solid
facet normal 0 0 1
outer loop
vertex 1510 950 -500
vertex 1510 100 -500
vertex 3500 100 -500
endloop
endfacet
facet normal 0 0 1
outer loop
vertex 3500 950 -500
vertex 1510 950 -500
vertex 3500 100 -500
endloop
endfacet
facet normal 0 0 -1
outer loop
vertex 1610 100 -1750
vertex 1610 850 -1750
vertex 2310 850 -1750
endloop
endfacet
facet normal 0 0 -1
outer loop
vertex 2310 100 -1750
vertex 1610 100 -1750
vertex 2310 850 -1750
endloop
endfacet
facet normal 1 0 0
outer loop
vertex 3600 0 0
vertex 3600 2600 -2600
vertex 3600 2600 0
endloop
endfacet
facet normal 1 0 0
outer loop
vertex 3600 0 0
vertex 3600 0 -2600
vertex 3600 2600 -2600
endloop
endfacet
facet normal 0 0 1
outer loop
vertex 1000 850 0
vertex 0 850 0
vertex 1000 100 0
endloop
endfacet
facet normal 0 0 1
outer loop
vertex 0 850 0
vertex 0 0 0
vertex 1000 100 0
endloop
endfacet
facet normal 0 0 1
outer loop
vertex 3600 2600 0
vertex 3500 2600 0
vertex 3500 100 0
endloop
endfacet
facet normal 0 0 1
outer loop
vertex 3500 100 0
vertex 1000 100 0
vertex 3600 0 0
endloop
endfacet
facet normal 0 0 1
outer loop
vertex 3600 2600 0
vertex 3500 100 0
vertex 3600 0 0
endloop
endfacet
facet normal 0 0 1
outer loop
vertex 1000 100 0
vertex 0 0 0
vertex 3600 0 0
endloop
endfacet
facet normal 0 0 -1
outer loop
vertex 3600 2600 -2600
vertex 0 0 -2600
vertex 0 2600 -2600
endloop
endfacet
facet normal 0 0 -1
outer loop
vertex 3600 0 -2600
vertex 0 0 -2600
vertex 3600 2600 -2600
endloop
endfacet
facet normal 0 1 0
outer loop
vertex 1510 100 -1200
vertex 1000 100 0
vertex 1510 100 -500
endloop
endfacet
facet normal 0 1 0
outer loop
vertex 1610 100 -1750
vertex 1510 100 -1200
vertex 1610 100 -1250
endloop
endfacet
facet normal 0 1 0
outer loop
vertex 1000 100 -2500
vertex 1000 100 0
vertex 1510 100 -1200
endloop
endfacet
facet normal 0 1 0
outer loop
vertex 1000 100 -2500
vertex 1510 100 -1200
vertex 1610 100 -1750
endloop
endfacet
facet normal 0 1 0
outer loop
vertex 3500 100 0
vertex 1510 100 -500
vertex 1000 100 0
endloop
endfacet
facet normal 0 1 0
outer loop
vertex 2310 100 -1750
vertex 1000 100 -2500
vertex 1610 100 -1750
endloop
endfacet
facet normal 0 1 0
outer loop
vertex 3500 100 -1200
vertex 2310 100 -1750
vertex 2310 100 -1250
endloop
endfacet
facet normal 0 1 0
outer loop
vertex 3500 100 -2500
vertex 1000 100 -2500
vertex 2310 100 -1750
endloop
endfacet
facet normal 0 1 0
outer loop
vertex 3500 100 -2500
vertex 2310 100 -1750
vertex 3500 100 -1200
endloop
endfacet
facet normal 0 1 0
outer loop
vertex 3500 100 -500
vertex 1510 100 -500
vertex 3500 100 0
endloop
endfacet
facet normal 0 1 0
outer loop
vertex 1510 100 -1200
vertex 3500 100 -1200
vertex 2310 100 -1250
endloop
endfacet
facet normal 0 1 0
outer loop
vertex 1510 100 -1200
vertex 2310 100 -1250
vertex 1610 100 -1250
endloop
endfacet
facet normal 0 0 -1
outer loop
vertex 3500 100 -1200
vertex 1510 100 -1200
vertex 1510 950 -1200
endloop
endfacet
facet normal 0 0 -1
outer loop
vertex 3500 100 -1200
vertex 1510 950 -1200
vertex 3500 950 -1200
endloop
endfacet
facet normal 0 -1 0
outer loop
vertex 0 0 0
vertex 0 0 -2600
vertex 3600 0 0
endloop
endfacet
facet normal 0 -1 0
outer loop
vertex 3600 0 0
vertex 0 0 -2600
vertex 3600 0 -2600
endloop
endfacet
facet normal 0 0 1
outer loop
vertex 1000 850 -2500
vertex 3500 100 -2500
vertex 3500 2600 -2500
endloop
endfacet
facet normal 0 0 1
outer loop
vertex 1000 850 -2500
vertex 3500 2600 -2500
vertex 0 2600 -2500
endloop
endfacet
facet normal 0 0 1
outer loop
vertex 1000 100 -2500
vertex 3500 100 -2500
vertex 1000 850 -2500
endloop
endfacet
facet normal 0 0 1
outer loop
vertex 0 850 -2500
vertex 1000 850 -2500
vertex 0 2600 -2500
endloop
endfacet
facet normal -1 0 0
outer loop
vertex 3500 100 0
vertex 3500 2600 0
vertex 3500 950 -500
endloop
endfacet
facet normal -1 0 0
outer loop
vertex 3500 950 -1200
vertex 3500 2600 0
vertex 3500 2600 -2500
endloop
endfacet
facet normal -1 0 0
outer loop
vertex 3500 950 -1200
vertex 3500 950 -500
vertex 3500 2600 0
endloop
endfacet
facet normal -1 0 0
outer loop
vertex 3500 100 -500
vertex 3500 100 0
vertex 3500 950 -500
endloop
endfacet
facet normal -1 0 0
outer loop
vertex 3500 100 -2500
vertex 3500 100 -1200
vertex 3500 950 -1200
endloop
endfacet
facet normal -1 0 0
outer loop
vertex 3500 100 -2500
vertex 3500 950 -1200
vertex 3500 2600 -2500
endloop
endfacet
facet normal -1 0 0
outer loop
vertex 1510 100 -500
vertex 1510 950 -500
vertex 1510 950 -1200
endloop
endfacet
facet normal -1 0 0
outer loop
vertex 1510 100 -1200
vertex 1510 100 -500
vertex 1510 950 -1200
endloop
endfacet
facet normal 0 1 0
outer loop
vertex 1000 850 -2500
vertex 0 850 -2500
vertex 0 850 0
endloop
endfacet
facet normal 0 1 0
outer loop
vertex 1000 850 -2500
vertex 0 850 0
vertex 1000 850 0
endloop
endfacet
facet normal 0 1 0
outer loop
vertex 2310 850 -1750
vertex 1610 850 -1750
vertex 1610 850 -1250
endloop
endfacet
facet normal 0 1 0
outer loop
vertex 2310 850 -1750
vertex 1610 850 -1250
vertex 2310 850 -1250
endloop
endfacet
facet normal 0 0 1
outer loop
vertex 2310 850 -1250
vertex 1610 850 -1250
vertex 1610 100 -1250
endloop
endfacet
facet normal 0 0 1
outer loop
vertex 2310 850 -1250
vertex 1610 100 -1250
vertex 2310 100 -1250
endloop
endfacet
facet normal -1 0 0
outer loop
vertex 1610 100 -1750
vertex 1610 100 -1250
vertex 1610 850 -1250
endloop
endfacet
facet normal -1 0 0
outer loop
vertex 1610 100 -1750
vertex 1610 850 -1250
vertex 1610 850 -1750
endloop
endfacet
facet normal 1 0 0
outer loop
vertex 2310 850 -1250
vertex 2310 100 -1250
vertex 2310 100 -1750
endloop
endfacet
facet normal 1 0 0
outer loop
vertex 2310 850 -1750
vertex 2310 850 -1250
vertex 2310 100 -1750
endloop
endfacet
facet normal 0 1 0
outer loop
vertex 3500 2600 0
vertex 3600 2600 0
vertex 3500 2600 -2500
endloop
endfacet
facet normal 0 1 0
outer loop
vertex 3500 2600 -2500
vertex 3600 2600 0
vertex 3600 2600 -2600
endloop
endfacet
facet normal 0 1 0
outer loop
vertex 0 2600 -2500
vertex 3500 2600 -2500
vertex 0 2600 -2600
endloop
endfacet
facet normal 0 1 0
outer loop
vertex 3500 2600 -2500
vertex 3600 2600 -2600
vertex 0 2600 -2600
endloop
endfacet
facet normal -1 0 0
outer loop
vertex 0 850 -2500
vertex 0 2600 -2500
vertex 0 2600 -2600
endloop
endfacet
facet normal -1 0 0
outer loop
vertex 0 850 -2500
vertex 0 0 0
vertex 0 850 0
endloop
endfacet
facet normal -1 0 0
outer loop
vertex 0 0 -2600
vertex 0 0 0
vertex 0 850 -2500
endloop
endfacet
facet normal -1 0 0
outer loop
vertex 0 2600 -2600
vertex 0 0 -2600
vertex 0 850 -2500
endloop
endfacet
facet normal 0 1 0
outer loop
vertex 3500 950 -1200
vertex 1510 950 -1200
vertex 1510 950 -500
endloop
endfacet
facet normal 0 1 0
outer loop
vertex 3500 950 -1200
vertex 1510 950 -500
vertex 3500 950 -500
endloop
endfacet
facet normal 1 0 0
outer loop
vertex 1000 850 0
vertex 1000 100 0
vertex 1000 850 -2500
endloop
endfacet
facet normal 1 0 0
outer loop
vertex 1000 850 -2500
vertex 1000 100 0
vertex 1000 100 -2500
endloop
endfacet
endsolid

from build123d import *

# Parameters (mm, degrees)
SKETCH1_W           = 3600
SKETCH1_H           = 2600
BOSS_EXTRUDE1_DEPTH = 100
BOSS_EXTRUDE2_DEPTH = 2500
SKETCH4_W           = 2000
SKETCH4_H           = 700
BOSS_EXTRUDE3_DEPTH = 850
SKETCH5_W           = 1000
SKETCH5_H           = 2500
BOSS_EXTRUDE4_DEPTH = 750
SKETCH6_W           = 700
SKETCH6_H           = 500
BOSS_EXTRUDE5_DEPTH = 750


with BuildPart() as part:
    # Sketch1 → Boss-Extrude1 (new body)
    with BuildSketch(Plane(origin=(0, 0, 0), x_dir=(1, 0, 0), z_dir=(0, 1, 0))):
        with Locations((1800, 1300)):
            Rectangle(SKETCH1_W, SKETCH1_H)
    extrude(amount=BOSS_EXTRUDE1_DEPTH)

    # Sketch2 → Boss-Extrude2 (add)
    with BuildSketch(Plane(origin=(0, 100, 0), x_dir=(1, 0, 0), z_dir=(0, 1, 0))):
        Polygon((3600, 0), (3500, 0), (3500, 2500), (0, 2500), (0, 2600), (3600, 2600), align=None)
    extrude(amount=BOSS_EXTRUDE2_DEPTH)

    # Sketch4 → Boss-Extrude3 (add)
    with BuildSketch(Plane(origin=(0, 100, 0), x_dir=(1, 0, 0), z_dir=(0, 1, 0))):
        with Locations((2510, 850)):
            Rectangle(SKETCH4_W, SKETCH4_H)
    extrude(amount=BOSS_EXTRUDE3_DEPTH)

    # Sketch5 → Boss-Extrude4 (add)
    with BuildSketch(Plane(origin=(0, 100, 0), x_dir=(1, 0, 0), z_dir=(0, 1, 0))):
        with Locations((500, 1250)):
            Rectangle(SKETCH5_W, SKETCH5_H)
    extrude(amount=BOSS_EXTRUDE4_DEPTH)

    # Sketch6 → Boss-Extrude5 (add)
    with BuildSketch(Plane(origin=(0, 100, 0), x_dir=(1, 0, 0), z_dir=(0, 1, 0))):
        with Locations((1960, 1500)):
            Rectangle(SKETCH6_W, SKETCH6_H)
    extrude(amount=BOSS_EXTRUDE5_DEPTH)


solid = part.part
